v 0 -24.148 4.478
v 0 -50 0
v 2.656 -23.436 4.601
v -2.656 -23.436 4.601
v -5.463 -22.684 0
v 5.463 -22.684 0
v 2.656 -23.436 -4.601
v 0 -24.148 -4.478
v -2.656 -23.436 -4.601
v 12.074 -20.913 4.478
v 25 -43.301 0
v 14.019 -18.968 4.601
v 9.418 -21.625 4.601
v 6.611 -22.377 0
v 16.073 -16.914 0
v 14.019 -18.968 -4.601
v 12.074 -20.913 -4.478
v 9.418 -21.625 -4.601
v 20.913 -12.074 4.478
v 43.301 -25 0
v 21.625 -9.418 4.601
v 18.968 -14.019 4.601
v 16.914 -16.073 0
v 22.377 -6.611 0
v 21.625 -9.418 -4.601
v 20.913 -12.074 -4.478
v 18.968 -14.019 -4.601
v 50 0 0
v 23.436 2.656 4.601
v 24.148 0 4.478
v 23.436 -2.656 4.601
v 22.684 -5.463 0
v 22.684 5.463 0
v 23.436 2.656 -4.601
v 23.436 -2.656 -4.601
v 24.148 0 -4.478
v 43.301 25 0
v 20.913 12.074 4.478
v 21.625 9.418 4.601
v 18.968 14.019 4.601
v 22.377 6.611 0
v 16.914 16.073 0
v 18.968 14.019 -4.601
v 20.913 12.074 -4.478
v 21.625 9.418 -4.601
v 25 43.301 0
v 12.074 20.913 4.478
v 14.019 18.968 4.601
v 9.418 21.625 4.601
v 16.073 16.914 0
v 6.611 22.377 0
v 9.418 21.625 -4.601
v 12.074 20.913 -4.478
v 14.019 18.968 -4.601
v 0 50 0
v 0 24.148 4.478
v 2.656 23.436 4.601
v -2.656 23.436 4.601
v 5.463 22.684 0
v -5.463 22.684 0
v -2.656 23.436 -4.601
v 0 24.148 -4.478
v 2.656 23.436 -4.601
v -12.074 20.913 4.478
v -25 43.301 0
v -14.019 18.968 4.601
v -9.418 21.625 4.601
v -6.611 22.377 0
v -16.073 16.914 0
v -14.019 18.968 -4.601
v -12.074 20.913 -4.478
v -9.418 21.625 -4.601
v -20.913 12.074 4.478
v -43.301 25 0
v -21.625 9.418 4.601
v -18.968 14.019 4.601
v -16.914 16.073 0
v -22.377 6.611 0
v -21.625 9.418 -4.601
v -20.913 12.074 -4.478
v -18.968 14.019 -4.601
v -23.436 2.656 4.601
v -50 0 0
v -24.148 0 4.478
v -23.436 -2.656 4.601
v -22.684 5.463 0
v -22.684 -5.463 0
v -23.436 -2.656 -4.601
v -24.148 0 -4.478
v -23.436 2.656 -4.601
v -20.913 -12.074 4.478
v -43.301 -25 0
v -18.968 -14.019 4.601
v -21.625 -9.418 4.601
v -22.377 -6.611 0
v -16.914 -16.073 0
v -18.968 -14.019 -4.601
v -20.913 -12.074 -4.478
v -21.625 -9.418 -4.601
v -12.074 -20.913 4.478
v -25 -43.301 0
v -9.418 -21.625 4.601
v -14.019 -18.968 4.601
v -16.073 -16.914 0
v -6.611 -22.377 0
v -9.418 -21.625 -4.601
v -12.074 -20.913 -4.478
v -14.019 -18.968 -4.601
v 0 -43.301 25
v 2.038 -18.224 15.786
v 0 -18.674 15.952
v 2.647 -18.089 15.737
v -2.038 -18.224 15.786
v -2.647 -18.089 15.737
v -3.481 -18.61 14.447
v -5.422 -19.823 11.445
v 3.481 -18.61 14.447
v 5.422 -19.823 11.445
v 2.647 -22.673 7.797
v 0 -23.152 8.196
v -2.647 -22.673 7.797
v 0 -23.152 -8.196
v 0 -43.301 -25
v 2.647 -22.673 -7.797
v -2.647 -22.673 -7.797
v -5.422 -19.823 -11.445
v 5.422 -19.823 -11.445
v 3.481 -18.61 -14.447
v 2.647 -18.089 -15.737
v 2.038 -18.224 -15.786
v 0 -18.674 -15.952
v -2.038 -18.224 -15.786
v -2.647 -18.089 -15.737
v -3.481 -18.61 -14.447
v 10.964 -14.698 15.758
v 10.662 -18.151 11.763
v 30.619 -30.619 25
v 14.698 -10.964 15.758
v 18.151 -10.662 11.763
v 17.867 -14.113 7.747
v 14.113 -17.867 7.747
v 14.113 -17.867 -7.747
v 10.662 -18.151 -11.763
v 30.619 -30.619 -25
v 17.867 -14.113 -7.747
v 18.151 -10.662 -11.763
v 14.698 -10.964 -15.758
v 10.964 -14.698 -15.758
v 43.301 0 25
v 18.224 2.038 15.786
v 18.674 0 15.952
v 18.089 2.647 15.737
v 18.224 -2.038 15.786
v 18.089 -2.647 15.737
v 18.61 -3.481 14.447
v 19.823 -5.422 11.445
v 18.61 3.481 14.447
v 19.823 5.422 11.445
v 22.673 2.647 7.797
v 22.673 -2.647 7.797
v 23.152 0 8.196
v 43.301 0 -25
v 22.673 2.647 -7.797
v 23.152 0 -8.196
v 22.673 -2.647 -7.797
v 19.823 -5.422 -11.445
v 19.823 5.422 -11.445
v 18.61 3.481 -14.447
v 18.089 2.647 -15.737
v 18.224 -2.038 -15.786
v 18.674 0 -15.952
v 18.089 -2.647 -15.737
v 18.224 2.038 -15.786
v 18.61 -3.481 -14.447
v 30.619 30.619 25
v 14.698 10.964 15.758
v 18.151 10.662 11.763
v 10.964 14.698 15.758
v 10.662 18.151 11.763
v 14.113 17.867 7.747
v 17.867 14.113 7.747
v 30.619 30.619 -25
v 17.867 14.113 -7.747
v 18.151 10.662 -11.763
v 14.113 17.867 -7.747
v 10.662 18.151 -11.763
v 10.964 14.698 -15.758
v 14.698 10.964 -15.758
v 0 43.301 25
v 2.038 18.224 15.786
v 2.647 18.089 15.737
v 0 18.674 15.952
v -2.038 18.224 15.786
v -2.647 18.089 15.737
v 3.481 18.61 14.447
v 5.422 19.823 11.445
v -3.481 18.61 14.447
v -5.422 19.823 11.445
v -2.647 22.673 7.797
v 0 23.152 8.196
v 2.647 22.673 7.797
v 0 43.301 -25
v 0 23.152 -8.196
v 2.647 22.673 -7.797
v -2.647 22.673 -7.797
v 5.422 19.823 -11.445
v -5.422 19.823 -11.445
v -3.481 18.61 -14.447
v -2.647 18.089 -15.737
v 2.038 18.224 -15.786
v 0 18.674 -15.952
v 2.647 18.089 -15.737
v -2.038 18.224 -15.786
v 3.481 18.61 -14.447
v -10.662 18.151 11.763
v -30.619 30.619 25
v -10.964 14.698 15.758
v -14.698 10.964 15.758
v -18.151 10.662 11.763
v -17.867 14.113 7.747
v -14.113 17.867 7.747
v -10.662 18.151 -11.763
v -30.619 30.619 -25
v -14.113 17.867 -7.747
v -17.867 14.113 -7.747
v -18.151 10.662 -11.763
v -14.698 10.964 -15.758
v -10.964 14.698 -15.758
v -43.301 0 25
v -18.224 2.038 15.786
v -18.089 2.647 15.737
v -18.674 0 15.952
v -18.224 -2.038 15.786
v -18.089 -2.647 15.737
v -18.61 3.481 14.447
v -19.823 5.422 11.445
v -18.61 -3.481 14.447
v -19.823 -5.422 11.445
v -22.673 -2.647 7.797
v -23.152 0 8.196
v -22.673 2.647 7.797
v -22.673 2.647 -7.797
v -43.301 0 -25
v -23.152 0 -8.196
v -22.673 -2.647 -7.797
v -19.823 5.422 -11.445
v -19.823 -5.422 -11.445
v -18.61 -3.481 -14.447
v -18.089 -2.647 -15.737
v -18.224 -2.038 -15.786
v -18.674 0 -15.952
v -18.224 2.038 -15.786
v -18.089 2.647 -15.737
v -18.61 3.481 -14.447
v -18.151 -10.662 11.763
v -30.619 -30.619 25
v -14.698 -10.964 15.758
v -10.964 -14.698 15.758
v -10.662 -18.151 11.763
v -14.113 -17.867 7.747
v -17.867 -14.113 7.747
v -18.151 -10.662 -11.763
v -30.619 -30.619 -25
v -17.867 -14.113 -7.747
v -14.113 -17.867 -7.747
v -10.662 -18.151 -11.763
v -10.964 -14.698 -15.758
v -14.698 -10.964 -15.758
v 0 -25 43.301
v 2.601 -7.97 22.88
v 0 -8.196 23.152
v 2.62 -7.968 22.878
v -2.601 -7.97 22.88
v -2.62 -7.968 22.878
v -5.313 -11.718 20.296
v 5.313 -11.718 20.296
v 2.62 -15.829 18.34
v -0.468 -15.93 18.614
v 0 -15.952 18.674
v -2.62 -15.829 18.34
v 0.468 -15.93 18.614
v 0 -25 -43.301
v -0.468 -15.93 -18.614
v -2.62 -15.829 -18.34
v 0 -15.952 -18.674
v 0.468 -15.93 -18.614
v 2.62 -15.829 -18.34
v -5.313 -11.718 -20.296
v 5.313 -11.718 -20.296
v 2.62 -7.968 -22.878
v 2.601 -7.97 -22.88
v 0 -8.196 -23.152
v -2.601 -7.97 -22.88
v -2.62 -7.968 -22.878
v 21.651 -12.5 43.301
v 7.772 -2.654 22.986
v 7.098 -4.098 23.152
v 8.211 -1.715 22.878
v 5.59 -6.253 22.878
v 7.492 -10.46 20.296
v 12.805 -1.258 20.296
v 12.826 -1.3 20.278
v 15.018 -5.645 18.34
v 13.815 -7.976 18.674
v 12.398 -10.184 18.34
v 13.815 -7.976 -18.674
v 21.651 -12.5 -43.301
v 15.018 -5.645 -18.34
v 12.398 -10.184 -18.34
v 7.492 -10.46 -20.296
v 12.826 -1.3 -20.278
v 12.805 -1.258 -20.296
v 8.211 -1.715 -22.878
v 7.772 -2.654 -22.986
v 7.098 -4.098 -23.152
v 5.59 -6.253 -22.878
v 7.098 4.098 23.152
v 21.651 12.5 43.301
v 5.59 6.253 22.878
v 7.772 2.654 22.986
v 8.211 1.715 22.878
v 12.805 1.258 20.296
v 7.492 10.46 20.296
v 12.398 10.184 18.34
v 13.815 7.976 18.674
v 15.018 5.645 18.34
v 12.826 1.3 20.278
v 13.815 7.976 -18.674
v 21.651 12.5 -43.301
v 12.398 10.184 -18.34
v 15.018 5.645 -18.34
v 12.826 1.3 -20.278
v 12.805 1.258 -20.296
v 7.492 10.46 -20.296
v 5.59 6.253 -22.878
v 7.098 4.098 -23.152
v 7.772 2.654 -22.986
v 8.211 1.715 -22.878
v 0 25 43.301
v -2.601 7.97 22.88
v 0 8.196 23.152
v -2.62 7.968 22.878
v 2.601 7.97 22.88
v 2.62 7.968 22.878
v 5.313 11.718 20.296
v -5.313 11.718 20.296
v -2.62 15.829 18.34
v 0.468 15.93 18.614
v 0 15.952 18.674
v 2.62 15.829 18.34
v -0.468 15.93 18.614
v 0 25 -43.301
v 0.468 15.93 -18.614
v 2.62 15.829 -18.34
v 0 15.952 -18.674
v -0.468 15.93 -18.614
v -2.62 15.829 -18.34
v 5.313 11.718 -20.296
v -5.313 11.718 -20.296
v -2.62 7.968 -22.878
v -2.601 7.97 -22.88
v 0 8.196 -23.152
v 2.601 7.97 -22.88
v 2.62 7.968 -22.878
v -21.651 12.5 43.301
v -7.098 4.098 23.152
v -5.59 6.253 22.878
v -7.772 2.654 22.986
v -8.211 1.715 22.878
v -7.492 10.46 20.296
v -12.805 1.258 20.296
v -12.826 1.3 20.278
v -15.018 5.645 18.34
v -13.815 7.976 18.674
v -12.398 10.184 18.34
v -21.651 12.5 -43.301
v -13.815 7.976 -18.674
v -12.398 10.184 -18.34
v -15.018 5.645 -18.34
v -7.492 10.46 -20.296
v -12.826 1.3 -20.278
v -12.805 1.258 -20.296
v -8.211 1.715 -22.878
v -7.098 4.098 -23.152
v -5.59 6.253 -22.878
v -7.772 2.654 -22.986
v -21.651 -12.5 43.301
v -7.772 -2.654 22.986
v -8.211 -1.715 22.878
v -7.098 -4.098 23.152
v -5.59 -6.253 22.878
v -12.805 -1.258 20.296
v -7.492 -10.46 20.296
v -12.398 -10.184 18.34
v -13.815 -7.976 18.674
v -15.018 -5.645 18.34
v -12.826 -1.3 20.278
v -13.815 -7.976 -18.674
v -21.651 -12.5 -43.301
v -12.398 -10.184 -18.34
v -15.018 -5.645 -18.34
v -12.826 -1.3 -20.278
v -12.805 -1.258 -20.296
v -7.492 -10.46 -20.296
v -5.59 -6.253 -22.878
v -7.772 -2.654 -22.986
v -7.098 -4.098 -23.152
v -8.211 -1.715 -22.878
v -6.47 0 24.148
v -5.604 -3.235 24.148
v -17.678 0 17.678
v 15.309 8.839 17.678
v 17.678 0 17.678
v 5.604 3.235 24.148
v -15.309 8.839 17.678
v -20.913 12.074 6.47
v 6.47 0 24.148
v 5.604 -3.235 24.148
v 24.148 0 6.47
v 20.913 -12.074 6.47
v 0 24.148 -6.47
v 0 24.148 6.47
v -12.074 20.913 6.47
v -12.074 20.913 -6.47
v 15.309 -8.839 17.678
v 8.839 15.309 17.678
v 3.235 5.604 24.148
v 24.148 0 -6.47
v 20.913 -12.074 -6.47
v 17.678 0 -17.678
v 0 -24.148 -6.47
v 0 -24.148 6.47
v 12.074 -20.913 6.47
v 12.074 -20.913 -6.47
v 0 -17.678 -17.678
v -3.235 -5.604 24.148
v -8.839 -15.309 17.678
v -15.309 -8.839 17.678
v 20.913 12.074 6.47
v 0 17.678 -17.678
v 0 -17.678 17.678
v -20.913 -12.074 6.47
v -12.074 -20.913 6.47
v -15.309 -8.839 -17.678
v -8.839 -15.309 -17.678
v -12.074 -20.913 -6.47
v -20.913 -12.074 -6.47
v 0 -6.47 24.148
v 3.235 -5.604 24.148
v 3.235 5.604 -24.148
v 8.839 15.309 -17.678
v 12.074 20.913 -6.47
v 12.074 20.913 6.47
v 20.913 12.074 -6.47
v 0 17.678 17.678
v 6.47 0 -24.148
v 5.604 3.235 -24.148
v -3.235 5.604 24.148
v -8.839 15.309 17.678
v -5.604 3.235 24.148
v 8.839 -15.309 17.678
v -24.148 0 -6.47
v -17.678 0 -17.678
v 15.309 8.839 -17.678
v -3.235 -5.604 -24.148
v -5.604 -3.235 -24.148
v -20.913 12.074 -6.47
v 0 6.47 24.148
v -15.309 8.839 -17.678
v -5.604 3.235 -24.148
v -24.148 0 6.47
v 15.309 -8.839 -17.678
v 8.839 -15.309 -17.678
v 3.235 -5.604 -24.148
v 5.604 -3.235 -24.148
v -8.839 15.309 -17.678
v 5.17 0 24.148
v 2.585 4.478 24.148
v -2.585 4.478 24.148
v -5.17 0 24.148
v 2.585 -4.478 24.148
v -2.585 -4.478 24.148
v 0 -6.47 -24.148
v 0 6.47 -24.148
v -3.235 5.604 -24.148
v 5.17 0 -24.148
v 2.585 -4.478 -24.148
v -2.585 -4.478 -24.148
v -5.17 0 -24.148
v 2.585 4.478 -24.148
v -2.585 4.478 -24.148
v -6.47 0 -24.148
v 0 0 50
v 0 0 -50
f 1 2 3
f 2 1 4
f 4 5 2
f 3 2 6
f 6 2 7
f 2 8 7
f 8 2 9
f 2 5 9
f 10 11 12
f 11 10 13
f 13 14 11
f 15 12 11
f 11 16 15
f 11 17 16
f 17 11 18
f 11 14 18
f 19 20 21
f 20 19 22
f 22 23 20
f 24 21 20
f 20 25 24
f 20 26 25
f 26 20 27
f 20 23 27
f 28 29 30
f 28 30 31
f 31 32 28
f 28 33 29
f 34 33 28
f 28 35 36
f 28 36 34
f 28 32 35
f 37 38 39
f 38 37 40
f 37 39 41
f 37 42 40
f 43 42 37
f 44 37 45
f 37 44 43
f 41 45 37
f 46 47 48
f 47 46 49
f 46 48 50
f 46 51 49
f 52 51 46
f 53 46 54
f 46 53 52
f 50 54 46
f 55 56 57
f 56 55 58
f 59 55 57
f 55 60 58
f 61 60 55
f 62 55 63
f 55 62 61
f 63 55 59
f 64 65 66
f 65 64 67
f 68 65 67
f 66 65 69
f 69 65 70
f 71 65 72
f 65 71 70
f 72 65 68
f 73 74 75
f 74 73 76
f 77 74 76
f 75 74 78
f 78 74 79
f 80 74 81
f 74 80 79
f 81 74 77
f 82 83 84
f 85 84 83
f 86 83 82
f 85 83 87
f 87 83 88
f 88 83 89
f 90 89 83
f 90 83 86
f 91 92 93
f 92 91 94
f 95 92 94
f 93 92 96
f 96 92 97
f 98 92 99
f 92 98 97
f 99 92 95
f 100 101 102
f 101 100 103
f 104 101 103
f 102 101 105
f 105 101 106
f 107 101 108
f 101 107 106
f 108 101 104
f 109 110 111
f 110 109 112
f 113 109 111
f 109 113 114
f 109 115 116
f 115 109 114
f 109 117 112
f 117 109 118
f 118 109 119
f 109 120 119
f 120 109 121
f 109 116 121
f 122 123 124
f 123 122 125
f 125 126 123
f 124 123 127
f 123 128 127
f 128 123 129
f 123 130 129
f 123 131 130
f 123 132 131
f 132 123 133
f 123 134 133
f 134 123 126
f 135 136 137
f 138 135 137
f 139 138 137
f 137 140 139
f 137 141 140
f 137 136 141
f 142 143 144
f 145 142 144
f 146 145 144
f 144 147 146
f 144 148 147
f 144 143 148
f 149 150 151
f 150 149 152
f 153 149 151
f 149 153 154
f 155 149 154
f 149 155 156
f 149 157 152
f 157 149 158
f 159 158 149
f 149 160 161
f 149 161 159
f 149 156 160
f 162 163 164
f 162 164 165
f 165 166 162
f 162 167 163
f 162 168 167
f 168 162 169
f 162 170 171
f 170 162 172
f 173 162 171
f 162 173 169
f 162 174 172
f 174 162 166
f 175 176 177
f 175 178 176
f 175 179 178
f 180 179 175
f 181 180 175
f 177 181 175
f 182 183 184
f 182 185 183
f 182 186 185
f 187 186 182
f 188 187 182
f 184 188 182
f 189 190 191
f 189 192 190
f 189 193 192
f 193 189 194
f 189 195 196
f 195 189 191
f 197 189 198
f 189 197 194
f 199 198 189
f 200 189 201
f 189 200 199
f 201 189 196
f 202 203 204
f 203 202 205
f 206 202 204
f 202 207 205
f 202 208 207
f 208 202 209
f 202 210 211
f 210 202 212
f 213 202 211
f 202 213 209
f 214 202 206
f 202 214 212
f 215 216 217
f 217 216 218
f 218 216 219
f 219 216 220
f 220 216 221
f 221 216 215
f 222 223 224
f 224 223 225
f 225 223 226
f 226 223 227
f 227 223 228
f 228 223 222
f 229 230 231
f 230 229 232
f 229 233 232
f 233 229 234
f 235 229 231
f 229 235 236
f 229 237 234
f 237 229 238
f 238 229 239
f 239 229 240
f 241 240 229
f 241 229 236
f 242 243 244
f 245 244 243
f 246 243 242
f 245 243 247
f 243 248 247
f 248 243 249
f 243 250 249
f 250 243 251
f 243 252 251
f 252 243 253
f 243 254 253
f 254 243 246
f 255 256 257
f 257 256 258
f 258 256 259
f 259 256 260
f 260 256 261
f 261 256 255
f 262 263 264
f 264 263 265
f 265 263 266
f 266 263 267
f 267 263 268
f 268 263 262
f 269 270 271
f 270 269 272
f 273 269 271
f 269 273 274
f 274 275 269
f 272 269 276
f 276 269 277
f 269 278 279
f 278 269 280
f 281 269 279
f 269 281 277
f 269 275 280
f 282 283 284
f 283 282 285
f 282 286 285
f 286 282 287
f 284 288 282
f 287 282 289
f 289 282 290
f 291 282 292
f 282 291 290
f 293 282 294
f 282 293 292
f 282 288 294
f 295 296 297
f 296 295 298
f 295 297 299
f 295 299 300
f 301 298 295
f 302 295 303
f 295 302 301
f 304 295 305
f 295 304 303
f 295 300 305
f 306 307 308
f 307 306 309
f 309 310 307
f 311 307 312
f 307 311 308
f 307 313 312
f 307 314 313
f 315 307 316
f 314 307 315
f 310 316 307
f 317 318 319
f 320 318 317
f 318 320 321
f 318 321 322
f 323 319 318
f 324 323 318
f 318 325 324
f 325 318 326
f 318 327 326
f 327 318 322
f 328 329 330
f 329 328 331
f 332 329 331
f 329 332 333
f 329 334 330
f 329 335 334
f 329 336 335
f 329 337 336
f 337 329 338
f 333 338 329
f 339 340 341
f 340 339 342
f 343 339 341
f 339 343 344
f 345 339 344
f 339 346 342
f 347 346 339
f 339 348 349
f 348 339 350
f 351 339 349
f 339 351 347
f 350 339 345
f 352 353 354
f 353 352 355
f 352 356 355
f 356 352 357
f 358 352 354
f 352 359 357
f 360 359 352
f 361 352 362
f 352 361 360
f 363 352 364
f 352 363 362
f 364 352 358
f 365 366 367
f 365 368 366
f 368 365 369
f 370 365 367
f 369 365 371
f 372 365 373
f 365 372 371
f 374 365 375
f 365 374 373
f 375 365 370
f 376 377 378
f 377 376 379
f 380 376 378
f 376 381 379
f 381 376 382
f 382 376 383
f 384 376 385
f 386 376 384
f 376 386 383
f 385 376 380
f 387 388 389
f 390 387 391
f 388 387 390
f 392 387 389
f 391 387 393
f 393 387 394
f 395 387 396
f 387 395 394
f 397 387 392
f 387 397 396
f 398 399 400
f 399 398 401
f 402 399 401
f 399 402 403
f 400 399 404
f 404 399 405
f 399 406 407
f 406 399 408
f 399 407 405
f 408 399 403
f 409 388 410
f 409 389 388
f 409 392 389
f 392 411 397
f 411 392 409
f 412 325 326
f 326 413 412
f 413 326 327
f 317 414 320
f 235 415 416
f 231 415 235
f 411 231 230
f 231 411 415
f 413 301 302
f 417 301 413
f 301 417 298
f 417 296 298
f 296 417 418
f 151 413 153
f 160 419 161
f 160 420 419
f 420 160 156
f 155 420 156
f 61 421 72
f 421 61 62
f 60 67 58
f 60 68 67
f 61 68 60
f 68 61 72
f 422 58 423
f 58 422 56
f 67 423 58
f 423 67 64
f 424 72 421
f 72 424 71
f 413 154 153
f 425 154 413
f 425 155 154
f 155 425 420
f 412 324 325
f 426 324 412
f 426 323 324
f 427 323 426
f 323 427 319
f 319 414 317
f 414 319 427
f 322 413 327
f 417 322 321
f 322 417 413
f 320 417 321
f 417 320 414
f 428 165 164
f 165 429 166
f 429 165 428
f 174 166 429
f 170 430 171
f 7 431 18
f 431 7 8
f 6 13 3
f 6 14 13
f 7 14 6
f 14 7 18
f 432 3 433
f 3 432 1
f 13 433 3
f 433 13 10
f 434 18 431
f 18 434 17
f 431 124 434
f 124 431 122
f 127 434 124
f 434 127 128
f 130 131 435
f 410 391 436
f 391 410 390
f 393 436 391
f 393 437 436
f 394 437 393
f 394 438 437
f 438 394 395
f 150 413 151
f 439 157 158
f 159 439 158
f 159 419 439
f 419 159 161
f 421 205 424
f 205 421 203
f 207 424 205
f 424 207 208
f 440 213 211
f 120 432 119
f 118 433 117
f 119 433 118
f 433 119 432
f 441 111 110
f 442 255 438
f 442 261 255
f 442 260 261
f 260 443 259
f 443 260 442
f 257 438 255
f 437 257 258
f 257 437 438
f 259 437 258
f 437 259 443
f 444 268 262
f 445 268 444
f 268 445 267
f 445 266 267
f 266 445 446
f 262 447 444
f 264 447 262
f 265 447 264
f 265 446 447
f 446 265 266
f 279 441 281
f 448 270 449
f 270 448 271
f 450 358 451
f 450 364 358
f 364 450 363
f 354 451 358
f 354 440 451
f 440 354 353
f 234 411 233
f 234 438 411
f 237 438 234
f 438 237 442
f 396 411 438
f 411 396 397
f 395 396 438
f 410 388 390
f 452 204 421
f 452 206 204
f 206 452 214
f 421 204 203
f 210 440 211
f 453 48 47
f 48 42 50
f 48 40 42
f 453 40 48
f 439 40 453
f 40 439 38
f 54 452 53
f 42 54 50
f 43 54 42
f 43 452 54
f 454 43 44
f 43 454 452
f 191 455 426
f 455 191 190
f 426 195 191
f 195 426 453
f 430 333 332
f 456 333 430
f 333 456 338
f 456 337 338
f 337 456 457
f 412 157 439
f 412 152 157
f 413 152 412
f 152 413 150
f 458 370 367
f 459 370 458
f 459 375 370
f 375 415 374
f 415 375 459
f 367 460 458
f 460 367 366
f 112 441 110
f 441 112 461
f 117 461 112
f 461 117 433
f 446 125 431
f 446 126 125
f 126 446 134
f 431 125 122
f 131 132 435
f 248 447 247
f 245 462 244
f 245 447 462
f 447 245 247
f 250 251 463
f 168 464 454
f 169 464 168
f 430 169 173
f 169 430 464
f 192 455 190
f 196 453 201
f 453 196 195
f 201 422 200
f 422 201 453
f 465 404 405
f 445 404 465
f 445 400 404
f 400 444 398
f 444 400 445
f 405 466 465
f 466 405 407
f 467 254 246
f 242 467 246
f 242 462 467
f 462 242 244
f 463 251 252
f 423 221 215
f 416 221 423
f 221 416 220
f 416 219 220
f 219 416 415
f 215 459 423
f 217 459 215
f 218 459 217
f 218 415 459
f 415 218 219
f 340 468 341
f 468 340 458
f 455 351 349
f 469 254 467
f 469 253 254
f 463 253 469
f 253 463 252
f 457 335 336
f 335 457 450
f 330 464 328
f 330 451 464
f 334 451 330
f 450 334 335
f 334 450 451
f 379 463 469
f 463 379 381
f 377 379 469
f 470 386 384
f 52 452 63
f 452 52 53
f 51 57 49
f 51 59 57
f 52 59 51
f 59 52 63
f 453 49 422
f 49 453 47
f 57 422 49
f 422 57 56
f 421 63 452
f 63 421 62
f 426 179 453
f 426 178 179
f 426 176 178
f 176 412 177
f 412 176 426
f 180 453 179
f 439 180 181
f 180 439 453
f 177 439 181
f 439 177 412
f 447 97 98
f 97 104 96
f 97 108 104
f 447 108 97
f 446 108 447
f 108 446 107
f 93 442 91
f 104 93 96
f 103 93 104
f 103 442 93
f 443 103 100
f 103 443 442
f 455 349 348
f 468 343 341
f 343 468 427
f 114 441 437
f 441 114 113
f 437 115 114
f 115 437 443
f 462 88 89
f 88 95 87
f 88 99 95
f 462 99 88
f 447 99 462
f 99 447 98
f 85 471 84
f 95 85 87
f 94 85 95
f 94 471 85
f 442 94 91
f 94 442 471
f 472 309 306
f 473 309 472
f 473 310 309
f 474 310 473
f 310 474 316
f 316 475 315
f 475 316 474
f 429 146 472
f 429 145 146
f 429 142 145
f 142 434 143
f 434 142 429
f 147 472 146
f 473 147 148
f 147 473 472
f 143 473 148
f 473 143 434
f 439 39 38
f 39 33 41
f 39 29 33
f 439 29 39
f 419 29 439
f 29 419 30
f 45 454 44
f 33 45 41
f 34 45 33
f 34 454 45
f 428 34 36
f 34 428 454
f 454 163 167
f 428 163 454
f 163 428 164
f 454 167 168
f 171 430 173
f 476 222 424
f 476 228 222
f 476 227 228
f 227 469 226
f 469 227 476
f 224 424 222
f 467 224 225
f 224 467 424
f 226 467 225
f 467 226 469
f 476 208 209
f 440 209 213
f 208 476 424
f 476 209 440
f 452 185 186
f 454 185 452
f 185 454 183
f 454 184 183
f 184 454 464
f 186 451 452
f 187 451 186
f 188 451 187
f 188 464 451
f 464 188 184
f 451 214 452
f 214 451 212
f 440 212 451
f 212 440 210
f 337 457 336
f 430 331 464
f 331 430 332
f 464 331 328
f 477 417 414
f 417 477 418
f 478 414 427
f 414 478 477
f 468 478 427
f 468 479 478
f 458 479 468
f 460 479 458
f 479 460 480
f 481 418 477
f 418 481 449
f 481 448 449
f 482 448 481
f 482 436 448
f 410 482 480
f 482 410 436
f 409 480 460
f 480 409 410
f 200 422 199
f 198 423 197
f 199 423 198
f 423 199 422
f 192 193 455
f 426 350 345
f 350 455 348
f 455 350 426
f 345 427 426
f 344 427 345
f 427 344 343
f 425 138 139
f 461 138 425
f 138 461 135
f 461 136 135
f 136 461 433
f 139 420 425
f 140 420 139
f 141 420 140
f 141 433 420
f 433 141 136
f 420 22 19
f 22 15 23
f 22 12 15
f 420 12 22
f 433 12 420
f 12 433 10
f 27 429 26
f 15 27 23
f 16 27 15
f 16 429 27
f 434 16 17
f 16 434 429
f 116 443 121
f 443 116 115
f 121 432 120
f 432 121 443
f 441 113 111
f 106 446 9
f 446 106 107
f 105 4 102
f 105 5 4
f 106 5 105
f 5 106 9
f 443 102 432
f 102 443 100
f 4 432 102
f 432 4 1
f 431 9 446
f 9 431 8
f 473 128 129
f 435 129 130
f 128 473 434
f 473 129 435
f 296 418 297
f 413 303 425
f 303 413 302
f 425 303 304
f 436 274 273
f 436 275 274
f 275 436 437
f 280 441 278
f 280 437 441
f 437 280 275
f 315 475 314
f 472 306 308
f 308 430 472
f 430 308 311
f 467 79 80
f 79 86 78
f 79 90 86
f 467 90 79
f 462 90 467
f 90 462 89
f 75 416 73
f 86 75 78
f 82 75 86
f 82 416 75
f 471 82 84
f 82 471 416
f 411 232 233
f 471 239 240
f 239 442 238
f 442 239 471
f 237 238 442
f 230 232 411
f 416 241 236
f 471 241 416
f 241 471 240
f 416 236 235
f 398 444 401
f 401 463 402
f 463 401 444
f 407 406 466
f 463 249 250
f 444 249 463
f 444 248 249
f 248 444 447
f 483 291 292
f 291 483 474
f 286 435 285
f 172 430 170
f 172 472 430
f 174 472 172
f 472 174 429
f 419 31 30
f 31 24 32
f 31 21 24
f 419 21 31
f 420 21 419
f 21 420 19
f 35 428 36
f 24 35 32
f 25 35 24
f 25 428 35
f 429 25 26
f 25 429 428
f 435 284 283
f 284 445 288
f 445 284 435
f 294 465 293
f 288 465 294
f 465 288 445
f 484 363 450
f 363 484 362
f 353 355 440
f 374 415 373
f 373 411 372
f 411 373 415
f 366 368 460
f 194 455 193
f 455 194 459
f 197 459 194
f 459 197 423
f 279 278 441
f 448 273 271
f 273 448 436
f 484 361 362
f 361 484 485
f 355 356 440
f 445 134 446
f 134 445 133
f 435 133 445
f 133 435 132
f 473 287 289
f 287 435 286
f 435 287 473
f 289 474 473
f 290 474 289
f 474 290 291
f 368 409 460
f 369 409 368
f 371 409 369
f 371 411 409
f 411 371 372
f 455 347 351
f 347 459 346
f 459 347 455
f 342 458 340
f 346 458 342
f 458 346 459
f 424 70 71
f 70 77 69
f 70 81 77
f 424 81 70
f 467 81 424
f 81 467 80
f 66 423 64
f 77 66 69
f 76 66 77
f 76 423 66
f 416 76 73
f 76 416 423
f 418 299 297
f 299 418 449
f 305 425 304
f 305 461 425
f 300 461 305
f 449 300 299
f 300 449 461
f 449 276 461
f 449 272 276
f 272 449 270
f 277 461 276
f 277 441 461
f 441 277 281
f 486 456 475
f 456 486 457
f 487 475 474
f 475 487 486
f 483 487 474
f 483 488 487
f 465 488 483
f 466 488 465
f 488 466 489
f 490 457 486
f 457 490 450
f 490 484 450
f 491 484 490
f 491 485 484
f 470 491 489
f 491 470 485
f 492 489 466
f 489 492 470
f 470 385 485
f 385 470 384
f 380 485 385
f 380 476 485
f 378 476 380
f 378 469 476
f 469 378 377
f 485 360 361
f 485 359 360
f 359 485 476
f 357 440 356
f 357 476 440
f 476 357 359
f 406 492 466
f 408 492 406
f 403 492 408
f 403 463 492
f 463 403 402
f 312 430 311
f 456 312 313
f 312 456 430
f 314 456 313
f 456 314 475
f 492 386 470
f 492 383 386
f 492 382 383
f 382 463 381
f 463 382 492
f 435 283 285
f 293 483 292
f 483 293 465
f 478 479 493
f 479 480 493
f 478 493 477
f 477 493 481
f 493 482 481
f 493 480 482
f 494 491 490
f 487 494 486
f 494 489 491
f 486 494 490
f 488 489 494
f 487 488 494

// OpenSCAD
module spike() {
    rotate_extrude($fn = 6)
    polygon([
        [0, 0],
        [10, 0],
        [0, 50],
    ]);
}

sphere(25, $fn = 12);

for (a = [0 : 30 : 359])
rotate([90, 0, a])
spike();

for (a = [0 : 45 : 359]) {
    rotate([60, 0, a])
    spike();

    rotate([120, 0, a])
    spike();
}

for (a = [0 : 60 : 359]) {
    rotate([30, 0, a])
    spike();

    rotate([150, 0, a])
    spike();
}

spike();

mirror([0, 0, 1])
spike();
